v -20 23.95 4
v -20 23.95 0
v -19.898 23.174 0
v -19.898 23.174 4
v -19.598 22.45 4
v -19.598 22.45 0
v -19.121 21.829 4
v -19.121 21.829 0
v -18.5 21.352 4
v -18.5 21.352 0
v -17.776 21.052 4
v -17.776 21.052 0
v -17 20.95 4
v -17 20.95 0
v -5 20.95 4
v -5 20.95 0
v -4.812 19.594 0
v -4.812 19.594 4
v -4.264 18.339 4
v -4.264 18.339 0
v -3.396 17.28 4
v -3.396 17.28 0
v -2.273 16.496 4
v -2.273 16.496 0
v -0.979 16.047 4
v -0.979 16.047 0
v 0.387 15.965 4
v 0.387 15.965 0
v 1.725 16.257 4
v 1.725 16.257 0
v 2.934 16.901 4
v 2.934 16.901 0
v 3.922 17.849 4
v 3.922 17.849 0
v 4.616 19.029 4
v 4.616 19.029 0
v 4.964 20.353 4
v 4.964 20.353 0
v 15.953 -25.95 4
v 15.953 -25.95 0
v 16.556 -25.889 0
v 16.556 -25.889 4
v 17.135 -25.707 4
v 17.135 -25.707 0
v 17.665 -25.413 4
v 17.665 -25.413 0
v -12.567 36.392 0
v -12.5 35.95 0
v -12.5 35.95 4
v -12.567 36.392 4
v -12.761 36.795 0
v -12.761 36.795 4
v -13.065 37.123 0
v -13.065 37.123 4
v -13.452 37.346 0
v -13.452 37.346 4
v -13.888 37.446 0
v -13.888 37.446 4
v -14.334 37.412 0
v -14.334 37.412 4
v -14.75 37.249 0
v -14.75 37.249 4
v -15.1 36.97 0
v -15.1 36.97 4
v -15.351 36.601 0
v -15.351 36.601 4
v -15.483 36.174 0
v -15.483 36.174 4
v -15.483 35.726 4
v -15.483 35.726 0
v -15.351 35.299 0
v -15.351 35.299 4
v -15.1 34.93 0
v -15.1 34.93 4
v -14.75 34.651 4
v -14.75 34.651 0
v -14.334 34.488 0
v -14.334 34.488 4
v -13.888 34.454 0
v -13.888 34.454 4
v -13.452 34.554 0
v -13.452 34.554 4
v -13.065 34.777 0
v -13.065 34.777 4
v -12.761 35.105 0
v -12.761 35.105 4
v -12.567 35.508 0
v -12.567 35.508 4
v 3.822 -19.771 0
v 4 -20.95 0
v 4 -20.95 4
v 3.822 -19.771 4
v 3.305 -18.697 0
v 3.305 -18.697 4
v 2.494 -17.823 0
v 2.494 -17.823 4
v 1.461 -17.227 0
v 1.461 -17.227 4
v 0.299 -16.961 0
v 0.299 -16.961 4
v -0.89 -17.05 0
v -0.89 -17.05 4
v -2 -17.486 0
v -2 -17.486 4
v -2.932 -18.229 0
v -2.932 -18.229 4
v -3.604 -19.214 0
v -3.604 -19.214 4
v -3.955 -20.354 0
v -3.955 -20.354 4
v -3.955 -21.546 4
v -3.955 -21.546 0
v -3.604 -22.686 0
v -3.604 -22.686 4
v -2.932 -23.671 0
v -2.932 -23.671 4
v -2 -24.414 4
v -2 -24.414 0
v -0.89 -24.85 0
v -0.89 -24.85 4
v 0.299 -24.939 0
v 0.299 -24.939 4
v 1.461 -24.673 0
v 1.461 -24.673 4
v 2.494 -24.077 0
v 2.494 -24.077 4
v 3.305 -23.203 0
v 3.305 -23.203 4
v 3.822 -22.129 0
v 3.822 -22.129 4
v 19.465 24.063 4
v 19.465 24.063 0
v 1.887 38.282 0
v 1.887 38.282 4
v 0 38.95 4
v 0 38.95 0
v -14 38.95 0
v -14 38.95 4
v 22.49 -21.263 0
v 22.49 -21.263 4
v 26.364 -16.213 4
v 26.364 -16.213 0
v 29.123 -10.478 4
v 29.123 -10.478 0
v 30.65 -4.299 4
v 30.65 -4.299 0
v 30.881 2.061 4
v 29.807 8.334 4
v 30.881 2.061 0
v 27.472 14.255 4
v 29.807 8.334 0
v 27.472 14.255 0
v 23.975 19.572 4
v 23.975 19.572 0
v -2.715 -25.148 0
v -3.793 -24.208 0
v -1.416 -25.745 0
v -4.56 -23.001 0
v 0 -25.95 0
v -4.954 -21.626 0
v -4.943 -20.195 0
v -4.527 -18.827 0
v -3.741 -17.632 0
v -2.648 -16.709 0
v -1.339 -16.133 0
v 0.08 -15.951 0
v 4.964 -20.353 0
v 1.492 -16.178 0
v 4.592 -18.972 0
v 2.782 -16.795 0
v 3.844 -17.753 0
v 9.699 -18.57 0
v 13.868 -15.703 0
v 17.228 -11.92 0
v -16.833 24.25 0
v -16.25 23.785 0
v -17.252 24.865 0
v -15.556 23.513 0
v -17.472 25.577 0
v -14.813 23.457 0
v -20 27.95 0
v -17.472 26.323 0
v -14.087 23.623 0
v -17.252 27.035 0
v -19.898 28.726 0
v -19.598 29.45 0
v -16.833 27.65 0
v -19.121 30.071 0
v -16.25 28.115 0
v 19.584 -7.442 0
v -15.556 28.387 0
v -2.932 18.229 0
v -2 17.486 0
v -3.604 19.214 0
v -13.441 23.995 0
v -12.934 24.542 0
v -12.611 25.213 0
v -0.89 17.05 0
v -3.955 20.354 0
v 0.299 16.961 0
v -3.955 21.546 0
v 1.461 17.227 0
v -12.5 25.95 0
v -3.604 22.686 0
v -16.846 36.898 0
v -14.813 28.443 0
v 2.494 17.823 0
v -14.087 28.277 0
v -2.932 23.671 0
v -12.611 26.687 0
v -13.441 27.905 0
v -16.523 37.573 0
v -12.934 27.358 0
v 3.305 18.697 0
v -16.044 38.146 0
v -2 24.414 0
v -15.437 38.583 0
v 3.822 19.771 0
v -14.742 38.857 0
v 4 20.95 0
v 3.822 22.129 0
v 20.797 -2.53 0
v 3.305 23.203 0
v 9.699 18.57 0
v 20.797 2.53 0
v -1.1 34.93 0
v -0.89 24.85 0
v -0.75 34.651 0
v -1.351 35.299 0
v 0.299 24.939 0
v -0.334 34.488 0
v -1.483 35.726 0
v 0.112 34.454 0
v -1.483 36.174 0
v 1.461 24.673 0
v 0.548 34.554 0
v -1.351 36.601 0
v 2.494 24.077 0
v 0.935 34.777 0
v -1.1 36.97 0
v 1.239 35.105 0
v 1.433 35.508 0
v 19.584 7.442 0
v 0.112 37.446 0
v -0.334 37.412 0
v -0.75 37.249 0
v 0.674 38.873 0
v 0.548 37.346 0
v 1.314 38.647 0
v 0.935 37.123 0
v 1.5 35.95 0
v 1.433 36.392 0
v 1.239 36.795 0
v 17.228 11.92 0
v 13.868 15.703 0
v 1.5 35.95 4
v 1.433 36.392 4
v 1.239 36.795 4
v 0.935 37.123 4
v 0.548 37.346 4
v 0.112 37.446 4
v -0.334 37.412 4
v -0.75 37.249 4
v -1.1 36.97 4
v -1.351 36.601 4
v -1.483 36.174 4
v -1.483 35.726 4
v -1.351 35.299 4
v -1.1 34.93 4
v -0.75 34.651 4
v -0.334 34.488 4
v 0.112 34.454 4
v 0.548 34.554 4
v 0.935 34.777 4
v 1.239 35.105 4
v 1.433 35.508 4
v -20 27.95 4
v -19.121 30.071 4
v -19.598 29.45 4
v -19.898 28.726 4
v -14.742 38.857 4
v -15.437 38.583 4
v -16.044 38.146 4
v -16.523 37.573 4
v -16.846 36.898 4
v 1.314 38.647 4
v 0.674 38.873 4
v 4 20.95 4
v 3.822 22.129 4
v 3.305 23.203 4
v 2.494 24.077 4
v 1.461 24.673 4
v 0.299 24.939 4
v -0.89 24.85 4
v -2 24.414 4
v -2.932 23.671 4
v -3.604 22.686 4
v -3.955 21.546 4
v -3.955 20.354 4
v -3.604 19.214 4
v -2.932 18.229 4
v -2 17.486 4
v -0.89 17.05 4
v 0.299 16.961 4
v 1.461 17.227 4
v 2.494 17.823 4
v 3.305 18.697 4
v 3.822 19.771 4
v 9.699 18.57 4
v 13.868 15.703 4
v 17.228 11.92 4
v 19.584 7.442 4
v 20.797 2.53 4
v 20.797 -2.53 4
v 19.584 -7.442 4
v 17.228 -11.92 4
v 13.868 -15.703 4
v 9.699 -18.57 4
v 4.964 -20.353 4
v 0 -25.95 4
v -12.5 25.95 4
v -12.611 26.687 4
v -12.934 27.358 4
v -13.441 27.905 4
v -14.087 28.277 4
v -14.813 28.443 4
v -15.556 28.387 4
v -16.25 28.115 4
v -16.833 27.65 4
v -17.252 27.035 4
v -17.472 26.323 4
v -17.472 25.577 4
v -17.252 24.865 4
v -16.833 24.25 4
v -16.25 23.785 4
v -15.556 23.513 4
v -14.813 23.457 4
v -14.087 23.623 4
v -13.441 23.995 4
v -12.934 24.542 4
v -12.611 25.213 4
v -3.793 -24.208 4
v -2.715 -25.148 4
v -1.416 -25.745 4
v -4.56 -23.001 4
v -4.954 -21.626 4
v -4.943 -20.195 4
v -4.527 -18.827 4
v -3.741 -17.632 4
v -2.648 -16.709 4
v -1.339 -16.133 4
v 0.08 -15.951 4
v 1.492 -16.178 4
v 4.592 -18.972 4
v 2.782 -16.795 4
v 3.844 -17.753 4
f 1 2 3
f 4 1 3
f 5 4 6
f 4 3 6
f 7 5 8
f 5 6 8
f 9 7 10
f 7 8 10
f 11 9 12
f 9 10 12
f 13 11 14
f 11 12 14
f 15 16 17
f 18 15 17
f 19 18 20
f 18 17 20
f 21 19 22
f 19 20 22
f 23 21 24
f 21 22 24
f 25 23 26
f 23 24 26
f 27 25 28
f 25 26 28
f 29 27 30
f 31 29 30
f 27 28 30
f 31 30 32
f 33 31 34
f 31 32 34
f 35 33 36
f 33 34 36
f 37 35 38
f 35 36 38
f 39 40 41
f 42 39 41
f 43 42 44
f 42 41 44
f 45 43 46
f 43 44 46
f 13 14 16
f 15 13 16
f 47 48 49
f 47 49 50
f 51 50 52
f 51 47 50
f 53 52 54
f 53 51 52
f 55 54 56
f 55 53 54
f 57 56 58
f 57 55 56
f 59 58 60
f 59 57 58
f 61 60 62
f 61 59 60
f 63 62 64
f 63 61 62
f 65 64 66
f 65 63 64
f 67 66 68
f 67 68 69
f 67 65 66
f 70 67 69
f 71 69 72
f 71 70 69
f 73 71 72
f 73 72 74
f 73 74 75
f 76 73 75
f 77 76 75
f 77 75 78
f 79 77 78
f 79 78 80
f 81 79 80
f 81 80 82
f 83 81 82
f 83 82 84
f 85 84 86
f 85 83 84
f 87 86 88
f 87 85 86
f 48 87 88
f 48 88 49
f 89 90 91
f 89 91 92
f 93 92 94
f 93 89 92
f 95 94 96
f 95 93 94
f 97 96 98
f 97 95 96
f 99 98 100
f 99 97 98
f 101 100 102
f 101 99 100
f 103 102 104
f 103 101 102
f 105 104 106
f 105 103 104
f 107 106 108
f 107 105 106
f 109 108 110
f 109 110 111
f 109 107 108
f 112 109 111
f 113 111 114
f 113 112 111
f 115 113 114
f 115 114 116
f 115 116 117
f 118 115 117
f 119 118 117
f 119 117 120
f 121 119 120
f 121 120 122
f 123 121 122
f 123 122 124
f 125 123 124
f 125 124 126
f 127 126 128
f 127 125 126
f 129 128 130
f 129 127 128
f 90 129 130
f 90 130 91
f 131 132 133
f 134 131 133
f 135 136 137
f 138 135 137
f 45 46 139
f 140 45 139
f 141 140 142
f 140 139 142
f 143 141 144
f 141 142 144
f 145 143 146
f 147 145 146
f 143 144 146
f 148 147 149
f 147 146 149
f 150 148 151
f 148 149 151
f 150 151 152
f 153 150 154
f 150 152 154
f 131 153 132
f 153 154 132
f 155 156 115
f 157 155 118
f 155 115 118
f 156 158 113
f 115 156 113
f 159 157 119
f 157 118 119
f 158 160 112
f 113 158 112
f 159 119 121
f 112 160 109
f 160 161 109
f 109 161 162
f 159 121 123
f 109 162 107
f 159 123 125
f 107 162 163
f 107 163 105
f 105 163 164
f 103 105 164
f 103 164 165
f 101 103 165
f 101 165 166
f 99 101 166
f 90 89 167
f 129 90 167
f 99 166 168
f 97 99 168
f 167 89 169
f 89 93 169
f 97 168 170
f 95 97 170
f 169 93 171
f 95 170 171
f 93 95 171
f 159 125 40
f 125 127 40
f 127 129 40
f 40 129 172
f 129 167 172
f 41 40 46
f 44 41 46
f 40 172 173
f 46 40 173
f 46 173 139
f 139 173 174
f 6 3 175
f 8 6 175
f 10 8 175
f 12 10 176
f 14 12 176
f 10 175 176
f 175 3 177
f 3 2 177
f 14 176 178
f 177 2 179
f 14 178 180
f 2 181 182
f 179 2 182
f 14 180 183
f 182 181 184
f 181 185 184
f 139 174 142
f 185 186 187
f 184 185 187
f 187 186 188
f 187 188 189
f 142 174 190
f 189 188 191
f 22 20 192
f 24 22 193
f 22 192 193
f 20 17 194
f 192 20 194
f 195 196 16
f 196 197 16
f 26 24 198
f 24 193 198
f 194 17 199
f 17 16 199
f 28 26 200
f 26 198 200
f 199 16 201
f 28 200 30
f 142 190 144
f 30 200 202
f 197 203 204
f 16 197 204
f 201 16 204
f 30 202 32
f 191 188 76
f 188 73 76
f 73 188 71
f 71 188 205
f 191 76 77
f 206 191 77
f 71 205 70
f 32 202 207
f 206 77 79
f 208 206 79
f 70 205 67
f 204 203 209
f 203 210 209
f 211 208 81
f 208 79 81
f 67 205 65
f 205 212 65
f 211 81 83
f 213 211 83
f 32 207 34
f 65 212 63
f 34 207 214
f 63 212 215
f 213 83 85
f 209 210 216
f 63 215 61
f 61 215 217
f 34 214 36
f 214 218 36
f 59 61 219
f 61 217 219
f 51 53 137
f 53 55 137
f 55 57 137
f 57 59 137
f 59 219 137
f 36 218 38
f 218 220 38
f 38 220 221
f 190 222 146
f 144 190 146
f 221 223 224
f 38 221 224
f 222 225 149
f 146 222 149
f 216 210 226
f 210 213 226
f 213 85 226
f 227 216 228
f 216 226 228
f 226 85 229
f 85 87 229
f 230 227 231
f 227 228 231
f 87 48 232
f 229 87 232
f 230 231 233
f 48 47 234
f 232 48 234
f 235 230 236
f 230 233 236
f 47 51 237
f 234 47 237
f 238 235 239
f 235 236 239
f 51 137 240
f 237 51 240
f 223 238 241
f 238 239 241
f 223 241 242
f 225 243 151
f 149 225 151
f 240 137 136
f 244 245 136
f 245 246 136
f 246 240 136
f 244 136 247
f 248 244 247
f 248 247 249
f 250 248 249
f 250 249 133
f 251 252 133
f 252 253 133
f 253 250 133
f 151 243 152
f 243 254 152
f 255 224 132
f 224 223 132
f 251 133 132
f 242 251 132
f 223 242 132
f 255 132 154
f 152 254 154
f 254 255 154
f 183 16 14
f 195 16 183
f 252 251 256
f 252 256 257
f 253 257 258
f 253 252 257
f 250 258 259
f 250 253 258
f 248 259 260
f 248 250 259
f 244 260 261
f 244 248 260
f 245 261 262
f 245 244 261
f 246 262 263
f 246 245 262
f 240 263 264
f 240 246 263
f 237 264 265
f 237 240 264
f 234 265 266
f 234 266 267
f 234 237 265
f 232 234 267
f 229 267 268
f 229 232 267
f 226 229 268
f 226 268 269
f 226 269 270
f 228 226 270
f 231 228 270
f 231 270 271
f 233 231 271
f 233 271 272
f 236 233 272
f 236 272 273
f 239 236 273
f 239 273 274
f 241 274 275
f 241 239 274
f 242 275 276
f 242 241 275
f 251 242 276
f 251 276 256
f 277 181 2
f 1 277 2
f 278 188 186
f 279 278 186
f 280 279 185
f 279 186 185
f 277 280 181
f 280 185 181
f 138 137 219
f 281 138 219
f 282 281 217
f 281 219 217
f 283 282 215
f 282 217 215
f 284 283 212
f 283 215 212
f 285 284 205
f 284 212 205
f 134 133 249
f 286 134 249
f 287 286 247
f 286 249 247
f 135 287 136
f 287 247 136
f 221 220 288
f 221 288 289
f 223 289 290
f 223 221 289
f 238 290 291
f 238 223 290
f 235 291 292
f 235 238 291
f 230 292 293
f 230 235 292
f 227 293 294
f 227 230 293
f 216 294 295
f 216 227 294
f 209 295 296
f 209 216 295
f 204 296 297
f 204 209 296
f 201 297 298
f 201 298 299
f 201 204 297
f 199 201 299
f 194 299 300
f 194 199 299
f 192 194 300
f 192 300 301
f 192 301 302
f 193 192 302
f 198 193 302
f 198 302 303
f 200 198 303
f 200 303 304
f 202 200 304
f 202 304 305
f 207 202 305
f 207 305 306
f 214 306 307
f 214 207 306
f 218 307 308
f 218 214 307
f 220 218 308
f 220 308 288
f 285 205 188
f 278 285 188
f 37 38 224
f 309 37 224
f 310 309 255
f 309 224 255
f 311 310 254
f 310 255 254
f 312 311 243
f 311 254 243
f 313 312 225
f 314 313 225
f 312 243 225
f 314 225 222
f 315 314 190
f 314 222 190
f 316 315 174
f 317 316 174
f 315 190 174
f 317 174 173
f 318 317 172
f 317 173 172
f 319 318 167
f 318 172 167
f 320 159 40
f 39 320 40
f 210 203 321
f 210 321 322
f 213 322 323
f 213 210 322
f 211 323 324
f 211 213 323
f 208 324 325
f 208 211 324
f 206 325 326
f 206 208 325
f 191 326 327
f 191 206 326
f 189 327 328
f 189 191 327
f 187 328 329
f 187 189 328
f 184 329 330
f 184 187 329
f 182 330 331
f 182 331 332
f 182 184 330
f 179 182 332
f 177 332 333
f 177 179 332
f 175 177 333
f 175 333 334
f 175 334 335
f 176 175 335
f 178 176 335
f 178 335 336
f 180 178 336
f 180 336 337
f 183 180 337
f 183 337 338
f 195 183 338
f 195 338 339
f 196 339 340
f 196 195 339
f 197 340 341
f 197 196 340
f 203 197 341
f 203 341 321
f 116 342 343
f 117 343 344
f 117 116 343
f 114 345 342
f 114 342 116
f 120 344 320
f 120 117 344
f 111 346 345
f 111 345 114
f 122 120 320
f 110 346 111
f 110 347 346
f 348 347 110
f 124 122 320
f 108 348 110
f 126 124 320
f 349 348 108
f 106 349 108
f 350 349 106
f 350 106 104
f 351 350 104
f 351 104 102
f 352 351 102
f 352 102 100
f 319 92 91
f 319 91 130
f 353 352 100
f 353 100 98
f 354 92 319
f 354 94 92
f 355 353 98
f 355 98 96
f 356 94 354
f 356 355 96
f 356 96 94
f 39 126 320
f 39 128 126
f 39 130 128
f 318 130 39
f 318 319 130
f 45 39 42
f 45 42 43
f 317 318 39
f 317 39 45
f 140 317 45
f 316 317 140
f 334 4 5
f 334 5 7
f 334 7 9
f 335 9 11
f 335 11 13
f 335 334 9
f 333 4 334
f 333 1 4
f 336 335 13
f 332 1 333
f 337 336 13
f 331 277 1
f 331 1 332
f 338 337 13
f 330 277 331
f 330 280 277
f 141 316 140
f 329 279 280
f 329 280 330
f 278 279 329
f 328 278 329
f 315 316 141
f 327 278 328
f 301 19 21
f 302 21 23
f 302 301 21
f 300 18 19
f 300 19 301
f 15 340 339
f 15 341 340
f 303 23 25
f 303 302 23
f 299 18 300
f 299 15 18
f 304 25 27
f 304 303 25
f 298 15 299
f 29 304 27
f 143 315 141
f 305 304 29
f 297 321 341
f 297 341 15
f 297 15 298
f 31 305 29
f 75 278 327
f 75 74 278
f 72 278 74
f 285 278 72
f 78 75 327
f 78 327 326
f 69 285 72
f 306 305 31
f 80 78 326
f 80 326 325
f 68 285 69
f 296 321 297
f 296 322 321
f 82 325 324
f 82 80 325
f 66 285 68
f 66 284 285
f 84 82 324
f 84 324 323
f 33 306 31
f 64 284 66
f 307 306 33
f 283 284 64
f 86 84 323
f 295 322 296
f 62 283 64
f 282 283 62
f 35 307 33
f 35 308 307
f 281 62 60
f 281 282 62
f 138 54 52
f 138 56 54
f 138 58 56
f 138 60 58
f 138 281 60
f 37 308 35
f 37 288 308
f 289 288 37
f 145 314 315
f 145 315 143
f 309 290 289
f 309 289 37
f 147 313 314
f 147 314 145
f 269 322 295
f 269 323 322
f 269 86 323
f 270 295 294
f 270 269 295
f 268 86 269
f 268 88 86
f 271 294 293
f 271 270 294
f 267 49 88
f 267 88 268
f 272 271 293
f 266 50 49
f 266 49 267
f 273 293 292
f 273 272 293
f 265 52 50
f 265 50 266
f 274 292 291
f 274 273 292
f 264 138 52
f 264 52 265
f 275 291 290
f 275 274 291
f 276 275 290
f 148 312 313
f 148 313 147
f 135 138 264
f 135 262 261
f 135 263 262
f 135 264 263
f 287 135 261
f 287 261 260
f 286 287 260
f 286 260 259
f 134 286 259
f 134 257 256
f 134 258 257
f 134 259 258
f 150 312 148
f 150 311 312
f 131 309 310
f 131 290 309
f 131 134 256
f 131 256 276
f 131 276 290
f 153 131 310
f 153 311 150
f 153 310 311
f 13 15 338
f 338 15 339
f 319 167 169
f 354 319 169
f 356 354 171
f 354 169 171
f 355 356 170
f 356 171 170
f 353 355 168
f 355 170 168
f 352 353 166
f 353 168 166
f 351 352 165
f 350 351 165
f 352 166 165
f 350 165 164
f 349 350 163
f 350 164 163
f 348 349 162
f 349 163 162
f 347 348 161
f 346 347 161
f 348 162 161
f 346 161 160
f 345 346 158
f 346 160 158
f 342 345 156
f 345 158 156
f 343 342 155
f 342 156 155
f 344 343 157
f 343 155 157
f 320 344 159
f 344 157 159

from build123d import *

# Parameters (mm, degrees)
CROQUIS1_R              = 4
CROQUIS1_R_2            = 2.5
CROQUIS1_R_3            = 1.5
SALIENTE_EXTRUIR1_DEPTH = 4


with BuildPart() as part:
    # Croquis1 → Saliente-Extruir1 (new body)
    with BuildSketch(Plane.XY):
        with BuildLine():
            ThreePointArc((17.665369851, -25.41332737), (30.929543207, -1.1251031), (19.465124293, 24.062656467))
            Line((19.465124293, 24.062656467), (1.886764875, 38.28240612))
            ThreePointArc((1.886764875, 38.28240612), (1.000695169, 38.778181249), (0, 38.95))
            Line((0, 38.95), (-14, 38.95))
            ThreePointArc((-14, 38.95), (-15.75421382, 38.383666755), (-16.84611457, 36.898489248))
            Line((-16.84611457, 36.898489248), (-19.121320344, 30.071320344))
            ThreePointArc((-19.121320344, 30.071320344), (-19.771638598, 29.098050297), (-20, 27.95))
            Line((-20, 27.95), (-20, 23.95))
            ThreePointArc((-20, 23.95), (-19.121320344, 21.828679656), (-17, 20.95))
            Line((-17, 20.95), (-5, 20.95))
            ThreePointArc((-5, 20.95), (-0.298863721, 15.958939945), (4.964272191, 20.353341289))
            ThreePointArc((4.964272191, 20.353341289), (20.95, 0), (4.964272191, -20.353341289))
            ThreePointArc((4.964272191, -20.353341289), (-3.740540974, -17.632116153), (0, -25.95))
            Line((0, -25.95), (15.953056134, -25.95))
            ThreePointArc((15.953056134, -25.95), (16.85027904, -25.812689479), (17.665369851, -25.41332737))
        make_face()
        with Locations((0, -20.95)):
            Circle(CROQUIS1_R, mode=Mode.SUBTRACT)
        with Locations((0, 20.95)):
            Circle(CROQUIS1_R, mode=Mode.SUBTRACT)
        with Locations((-15, 25.95)):
            Circle(CROQUIS1_R_2, mode=Mode.SUBTRACT)
        with Locations((0, 35.95)):
            Circle(CROQUIS1_R_3, mode=Mode.SUBTRACT)
        with Locations((-14, 35.95)):
            Circle(CROQUIS1_R_3, mode=Mode.SUBTRACT)
    extrude(amount=SALIENTE_EXTRUIR1_DEPTH)


solid = part.part
